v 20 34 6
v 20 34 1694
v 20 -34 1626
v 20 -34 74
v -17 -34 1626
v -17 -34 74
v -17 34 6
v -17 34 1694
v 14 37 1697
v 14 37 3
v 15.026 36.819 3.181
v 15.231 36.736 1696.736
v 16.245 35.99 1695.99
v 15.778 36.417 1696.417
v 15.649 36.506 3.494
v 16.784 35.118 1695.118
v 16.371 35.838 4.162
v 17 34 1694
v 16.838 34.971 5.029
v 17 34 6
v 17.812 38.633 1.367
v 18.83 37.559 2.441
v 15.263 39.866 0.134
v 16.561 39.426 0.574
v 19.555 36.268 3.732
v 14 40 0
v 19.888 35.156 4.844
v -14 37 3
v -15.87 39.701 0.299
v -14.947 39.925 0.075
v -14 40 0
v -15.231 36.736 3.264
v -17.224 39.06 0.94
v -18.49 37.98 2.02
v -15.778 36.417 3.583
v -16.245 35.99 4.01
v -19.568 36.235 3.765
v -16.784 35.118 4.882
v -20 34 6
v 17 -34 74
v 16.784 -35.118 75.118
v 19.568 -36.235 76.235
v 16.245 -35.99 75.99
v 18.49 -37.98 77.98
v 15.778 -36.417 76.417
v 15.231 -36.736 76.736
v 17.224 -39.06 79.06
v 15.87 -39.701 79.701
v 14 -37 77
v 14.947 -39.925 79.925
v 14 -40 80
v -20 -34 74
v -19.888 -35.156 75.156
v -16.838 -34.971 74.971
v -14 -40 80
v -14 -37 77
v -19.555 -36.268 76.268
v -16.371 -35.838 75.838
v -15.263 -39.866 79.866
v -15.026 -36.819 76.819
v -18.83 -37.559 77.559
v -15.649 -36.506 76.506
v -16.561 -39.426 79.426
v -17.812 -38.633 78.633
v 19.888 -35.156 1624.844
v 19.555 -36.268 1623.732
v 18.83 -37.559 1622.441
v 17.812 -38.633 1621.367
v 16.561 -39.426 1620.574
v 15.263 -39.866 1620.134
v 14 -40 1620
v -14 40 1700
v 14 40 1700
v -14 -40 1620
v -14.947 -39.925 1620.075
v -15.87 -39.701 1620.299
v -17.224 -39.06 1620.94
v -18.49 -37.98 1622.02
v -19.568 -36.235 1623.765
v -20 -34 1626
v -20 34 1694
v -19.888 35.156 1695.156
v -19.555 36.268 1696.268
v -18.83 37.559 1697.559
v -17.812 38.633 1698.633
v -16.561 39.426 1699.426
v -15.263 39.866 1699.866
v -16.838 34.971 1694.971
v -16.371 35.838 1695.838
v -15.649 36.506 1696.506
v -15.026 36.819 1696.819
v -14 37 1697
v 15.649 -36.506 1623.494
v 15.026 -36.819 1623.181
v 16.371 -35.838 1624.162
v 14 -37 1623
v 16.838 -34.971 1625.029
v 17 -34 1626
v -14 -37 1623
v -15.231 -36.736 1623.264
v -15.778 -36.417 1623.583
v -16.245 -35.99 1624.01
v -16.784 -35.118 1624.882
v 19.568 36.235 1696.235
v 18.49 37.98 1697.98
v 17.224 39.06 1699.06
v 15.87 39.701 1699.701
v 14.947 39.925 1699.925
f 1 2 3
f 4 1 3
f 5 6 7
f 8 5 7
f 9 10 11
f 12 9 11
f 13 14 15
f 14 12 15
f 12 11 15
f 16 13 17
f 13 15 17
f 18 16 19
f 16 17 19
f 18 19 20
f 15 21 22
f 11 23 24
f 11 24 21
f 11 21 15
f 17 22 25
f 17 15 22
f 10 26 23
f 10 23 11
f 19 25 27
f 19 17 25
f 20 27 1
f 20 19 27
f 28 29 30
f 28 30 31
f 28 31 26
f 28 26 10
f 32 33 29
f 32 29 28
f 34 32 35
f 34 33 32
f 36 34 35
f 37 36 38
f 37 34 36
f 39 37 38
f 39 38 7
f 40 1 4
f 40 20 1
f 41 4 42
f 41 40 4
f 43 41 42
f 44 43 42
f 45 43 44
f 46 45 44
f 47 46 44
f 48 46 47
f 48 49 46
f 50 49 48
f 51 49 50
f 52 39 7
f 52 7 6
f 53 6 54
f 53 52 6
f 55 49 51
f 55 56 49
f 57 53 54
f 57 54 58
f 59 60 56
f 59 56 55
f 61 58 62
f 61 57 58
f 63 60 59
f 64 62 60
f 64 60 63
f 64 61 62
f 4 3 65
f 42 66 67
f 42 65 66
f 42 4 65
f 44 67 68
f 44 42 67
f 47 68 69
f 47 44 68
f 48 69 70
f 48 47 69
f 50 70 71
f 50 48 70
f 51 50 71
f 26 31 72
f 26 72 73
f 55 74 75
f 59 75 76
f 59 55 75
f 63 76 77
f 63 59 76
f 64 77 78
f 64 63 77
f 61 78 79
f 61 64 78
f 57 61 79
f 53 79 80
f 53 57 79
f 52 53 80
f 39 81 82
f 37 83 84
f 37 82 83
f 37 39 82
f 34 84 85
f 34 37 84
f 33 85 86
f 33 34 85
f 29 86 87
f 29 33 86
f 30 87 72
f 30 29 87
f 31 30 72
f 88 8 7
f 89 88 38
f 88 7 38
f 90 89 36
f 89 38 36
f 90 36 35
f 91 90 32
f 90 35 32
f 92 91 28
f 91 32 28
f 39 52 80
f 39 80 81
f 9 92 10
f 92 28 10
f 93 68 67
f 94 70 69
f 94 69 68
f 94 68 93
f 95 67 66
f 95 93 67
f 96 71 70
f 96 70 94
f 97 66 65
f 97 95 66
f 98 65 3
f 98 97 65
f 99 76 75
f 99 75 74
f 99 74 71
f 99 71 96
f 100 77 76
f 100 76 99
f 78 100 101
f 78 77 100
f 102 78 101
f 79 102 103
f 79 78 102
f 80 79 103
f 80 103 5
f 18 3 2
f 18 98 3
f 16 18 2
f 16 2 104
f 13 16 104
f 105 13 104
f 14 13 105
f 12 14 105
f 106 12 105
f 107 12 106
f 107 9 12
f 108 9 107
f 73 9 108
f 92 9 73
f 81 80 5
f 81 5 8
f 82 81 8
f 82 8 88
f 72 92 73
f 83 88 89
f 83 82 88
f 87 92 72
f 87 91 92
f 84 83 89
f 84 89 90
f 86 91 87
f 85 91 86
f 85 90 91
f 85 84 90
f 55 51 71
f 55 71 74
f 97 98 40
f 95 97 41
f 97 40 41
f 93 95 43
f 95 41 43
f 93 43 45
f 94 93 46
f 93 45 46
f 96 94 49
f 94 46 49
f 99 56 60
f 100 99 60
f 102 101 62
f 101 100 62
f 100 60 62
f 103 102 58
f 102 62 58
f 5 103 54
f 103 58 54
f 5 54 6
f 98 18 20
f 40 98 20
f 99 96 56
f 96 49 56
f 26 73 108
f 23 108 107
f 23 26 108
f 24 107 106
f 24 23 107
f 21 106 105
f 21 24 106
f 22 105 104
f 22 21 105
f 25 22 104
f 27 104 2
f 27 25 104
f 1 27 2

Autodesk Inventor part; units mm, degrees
ref_plane "Start Plane" through (0, 0, 0) normal (0, 0, 1) x (1, 0, 0)
ref_plane "End Plane" through (0, 0, 1700) normal (0, 0, 1) x (1, 0, 0)
sketch "Sketch" plane through (0, 0, 0) normal (0, 0, 1) x (1, 0, 0)
  line L0 (-20, -34) -> (-20, 34)
  line L1 (-14, 40) -> (14, 40)
  line L2 (20, 34) -> (20, -34)
  line L3 (14, -40) -> (-14, -40)
  arc A0 (-20, -34) -> (-14, -40) centre (-14, -34) ccw
  arc A1 (20, 34) -> (14, 40) centre (14, 34) ccw
  arc A2 (-14, 40) -> (-20, 34) centre (-14, 34) ccw
  arc A3 (14, -40) -> (20, -34) centre (14, -34) ccw
  arc A4 (-14, 37) -> (-17, 34) centre (-14, 34) ccw
  line L4 (-14, 37) -> (14, 37)
  arc A5 (17, 34) -> (14, 37) centre (14, 34) ccw
  line L5 (17, 34) -> (17, -34)
  arc A6 (14, -37) -> (17, -34) centre (14, -34) ccw
  line L6 (14, -37) -> (-14, -37)
  arc A7 (-17, -34) -> (-14, -37) centre (-14, -34) ccw
  line L7 (-17, -34) -> (-17, 34)
  line L8 (0, 57.7397) -> (0, -57.7397) construction
  line L9 (-29.7397, 0) -> (29.7397, 0) construction
  dimension "d7" = 6
  dimension "d9" = 40
  dimension "d11" = 80
  dimension "d12" = 3
  dimension "d15" = 20
  dimension "d16" = 40
extrude "Body" add sketch "Sketch" along normal up to surface (1700 mm away) from surface at 0
sketch "Sketch3" plane through (0, 0, 0) normal (0, 0, 1) x (1, 0, 0)
  line L0 (0, 0) -> (10, 0)
ref_plane "Work Plane3" through (0, 0, 0) normal (0, -1, 0) x (1, 0, 0)
ref_plane "Work Plane4" through (0, 40, 1700) normal (0, -0.7071, 0.7071) x (1, 0, 0)
split "Split1" plane through (0, 40, 1700) removes the side toward (0, -0.7071, 0.7071)
ref_plane "Work Plane5" through (0, 40, 0) normal (0, -0.7071, -0.7071) x (1, 0, 0)
split "Split2" plane through (0, 40, 0) removes the side toward (0, -0.7071, -0.7071)
sketch "Sketch4" plane through (0, 0, 0) normal (0, -1, 0) x (1, 0, 0)
  line L0 (-2, 0) -> (12, 0) projected
  line L1 (-2, 1700) -> (12, 1700) projected
  dimension "d18" = 1700
equation "\"d7\" = G_IR"
equation "\"d9\" = G_W"
equation "\"d11\" = G_H"
equation "\"d12\" = G_T"
equation "\"d15\" = 0.5 * d9"
equation "\"d16\" = 0.5 * d11"
equation "\"d3\" = G_L"
equation "\"G_W\" = 40"
equation "\"G_H\" = 80"
equation "\"G_T\" = 3"
equation "\"G_IR\" = 6"
equation "\"G_L\" = d18"
equation "\"G_OFFSET_START\" = 0"
equation "\"G_OFFSET_END\" = 0"
properties part number "ISO 10799-2 - 80x40x3 - 1700" material "Stainless Steel"
